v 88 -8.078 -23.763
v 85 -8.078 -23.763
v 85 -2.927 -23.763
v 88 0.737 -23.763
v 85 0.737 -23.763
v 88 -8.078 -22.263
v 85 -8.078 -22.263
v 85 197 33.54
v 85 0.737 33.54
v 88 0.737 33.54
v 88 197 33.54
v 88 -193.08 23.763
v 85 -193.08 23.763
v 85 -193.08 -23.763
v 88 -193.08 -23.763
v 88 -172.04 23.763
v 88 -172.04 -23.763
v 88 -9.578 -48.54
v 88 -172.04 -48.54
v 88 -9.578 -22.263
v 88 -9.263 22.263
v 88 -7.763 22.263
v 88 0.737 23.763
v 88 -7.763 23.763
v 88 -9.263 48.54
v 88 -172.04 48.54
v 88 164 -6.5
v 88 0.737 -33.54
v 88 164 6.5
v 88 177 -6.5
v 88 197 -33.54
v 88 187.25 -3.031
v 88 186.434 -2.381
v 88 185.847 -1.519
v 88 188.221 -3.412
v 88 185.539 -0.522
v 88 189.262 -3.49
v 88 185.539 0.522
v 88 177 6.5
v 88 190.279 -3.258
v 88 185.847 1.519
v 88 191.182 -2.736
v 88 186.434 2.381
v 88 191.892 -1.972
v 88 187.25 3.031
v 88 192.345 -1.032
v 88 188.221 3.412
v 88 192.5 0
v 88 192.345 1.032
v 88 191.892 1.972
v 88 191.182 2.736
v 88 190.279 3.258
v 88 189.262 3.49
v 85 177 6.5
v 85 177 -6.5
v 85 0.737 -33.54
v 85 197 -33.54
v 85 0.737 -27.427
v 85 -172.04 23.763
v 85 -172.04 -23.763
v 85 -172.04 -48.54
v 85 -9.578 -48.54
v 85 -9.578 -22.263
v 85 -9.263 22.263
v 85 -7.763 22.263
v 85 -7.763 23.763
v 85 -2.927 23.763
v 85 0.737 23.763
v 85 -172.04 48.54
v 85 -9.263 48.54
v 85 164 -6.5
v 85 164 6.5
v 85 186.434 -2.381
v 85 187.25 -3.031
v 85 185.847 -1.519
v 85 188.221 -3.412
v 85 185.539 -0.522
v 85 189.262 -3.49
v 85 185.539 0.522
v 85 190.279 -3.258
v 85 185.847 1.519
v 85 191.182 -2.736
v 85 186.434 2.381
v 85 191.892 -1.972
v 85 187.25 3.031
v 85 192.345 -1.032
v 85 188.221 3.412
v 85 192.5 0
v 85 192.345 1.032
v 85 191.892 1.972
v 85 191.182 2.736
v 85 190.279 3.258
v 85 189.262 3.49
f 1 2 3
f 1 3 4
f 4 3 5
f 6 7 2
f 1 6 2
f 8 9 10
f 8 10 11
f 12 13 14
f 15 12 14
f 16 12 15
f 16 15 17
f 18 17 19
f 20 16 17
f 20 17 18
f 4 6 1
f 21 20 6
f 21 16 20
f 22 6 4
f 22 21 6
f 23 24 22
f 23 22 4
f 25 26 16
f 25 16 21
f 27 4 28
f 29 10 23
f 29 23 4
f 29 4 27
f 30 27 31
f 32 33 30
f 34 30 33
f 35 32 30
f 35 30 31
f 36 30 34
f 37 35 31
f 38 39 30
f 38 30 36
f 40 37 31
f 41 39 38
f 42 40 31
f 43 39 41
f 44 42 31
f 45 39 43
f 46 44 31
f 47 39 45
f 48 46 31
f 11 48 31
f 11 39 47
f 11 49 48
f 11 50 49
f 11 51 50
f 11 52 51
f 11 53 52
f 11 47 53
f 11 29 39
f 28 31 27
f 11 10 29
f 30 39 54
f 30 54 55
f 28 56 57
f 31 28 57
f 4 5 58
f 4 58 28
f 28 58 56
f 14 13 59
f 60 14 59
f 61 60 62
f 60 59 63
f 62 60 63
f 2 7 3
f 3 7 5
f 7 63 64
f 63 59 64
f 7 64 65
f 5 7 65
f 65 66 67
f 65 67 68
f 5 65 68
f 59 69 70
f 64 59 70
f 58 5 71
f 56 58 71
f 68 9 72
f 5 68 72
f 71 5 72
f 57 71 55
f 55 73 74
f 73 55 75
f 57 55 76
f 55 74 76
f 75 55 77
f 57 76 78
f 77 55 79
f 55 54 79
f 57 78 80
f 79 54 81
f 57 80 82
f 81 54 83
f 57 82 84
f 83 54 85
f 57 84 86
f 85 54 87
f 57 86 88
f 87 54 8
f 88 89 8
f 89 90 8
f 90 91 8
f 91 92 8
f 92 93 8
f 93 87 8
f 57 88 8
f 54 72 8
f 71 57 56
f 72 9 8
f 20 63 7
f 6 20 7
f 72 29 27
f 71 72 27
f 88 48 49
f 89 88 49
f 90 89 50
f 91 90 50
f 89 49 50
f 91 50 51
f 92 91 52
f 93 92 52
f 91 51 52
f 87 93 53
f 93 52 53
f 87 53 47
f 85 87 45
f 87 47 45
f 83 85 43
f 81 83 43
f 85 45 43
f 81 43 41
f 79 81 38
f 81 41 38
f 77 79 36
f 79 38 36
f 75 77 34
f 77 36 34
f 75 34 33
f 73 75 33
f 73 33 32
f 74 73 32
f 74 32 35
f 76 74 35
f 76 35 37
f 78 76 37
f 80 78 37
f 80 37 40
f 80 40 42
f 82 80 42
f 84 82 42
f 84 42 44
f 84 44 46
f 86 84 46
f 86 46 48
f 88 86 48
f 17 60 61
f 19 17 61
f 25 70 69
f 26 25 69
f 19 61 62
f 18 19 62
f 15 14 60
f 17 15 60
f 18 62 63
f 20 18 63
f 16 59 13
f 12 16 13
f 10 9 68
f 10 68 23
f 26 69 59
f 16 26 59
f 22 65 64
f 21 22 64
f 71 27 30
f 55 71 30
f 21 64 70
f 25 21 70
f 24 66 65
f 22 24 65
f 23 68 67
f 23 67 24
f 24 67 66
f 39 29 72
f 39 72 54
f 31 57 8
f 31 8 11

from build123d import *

# Parameters (mm, degrees)
SKETCH1_W                     = 170
SKETCH1_H                     = 55
BASE_FLANGE1_DEPTH            = 3
EDGE_FLANGE1_STRIP_W          = 13.4732
EDGE_FLANGE1_STRIP_H          = 3
EDGE_FLANGE1_STRIP_CUT_DEPTH  = 162.776884107
EDGE_FLANGE1_RELIEF_W         = 14.9732
EDGE_FLANGE1_RELIEF_H         = 1.5
EDGE_FLANGE1_RELIEF_CUT_DEPTH = 3
EDGE_FLANGE1_DEPTH            = 162.776884107
EDGE_FLANGE2_STRIP_W          = 13.4732
EDGE_FLANGE2_STRIP_H          = 3
EDGE_FLANGE2_STRIP_CUT_DEPTH  = 162.461666913
EDGE_FLANGE2_RELIEF_W         = 14.9732
EDGE_FLANGE2_RELIEF_H         = 1.5
EDGE_FLANGE2_RELIEF_CUT_DEPTH = 3
EDGE_FLANGE2_DEPTH            = 162.461666913
EDGE_FLANGE3_STRIP_W          = 13.4732
EDGE_FLANGE3_STRIP_H          = 3
EDGE_FLANGE3_STRIP_CUT_DEPTH  = 47.5268
EDGE_FLANGE3_DEPTH            = 47.5268
EDGE_FLANGE4_STRIP_W          = 13.4732
EDGE_FLANGE4_STRIP_H          = 3
EDGE_FLANGE4_STRIP_CUT_DEPTH  = 55
EDGE_FLANGE4_DEPTH            = 55
EDGE_FLANGE5_STRIP_W          = 13.4732
EDGE_FLANGE5_STRIP_H          = 3
EDGE_FLANGE5_STRIP_CUT_DEPTH  = 196.2634
EDGE_FLANGE5_DEPTH            = 196.2634
EDGE_FLANGE6_STRIP_W          = 13.4732
EDGE_FLANGE6_STRIP_H          = 3
EDGE_FLANGE6_STRIP_CUT_DEPTH  = 196.2634
EDGE_FLANGE6_DEPTH            = 196.2634
SKETCH27_R                    = 3.5
SKETCH27_W                    = 13
SKETCH27_H                    = 13
CUT_EXTRUDE1_DEPTH            = 10
UNFOLD1_START                 = -85
UNFOLD1_DEPTH                 = 170
UNFOLD1_START_2               = 85
UNFOLD1_2_DEPTH               = 3
SKETCH28_W                    = 4.727050269
SKETCH28_H                    = 8.499758958
CUT_EXTRUDE2_DEPTH            = 10
SKETCH29_W                    = 4.501036857
SKETCH29_H                    = 9.383895171
CUT_EXTRUDE3_DEPTH            = 10
FOLD2_START                   = -193.080086129
FOLD2_OUTLINE_W               = 3
FOLD2_OUTLINE_H               = 97.08008613
FOLD2_DEPTH                   = 190.080086129
FOLD2_START_2                 = 0.7366
FOLD2_2_DEPTH                 = 196.2634
FOLD2_START_3                 = -2.776643065
FOLD2_3_DEPTH                 = 2.776643065
FOLD2_4_OUTLINE_W             = 162.776884107
FOLD2_4_OUTLINE_H             = 3
FOLD2_4_OUTLINE_W_2           = 162.461666913
FOLD2_4_DEPTH                 = 21.2634
FOLD2_START_4                 = 22
FOLD2_5_DEPTH                 = 175
FOLD2_START_5                 = 87.103787073
FOLD2_6_OUTLINE_W             = 0.223356935
FOLD2_6_OUTLINE_H             = 47.5268
FOLD2_6_DEPTH                 = 1.896212927
FOLD2_START_6                 = -85
FOLD2_7_DEPTH                 = 162.461666913
FOLD2_START_7                 = -106.040043065
FOLD2_8_OUTLINE_W             = 0.223356935
FOLD2_8_OUTLINE_H             = 47.5268
FOLD2_8_DEPTH                 = 21.040043065
FOLD2_START_8                 = 79.276884107
FOLD2_9_OUTLINE_W             = 0.223356935
FOLD2_9_OUTLINE_H             = 47.5268
FOLD2_9_DEPTH                 = 4.986515893
FOLD2_START_9                 = 77.461666913
FOLD2_10_DEPTH                = 0.315217194
FOLD2_START_10                = -23.7634
FOLD2_11_DEPTH                = 47.5268
FOLD2_START_11                = -22.2634
FOLD2_12_OUTLINE_W            = 1.815217194
FOLD2_12_OUTLINE_H            = 0.223356935
FOLD2_12_DEPTH                = 44.5268
FOLD2_13_DEPTH                = 47.5268
FOLD2_14_OUTLINE_W            = 0.315217194
FOLD2_14_OUTLINE_H            = 0.223356935
FOLD2_14_DEPTH                = 46.0268
FOLD2_15_OUTLINE_W            = 0.315217194
FOLD2_15_OUTLINE_H            = 0.223356935
FOLD2_15_DEPTH                = 46.0268
FOLD3_START                   = -23.7634
FOLD3_DEPTH                   = 47.5268
FOLD3_2_DEPTH                 = 47.5268
UNFOLD2_START                 = -85
UNFOLD2_DEPTH                 = 170
UNFOLD2_START_2               = 85
UNFOLD2_2_OUTLINE_W           = 196.2634
UNFOLD2_2_OUTLINE_H           = 9.776643065
UNFOLD2_2_DEPTH               = 3


with BuildPart() as part:
    # Base-Flange1: sheet metal written as solids
    # Sketch1 → Base-Flange1 (new body)
    with BuildSketch(Plane(origin=(0, 0, 0), x_dir=(1, 0, 0), z_dir=(0, 1, 0))):
        Rectangle(SKETCH1_W, SKETCH1_H)
    extrude(amount=-BASE_FLANGE1_DEPTH)

    # Edge-Flange1: sheet metal written as solids
    # Edge-Flange1 strip (on a plane across the edge) → Edge-Flange1 strip cut (cut)
    with BuildSketch(Plane(origin=(-85, 0, 27.5), x_dir=(0, 0, -1), z_dir=(1, 0, 0))):
        with Locations((-3, -1.5)):
            Rectangle(EDGE_FLANGE1_STRIP_W, EDGE_FLANGE1_STRIP_H)
    extrude(amount=EDGE_FLANGE1_STRIP_CUT_DEPTH, mode=Mode.SUBTRACT)

    # Edge-Flange1 relief (on the sheet) → Edge-Flange1 relief cut (cut)
    with BuildSketch(Plane(origin=(-85, 0, 23.7634), x_dir=(0, 0, -1), z_dir=(0, 1, 0))):
        with Locations((-5.9866, -163.526884107)):
            Rectangle(EDGE_FLANGE1_RELIEF_W, EDGE_FLANGE1_RELIEF_H)
    extrude(amount=-EDGE_FLANGE1_RELIEF_CUT_DEPTH, mode=Mode.SUBTRACT)

    # Edge-Flange1 section (on a plane across the edge) → Edge-Flange1 (add)
    with BuildSketch(Plane(origin=(-85, 0, 27.5), x_dir=(0, 0, -1), z_dir=(1, 0, 0))):
        with BuildLine():
            Line((0, 0.7366), (0, 22))
            Line((0, 22), (3, 22))
            Line((3, 22), (3, 0.7366))
            ThreePointArc((3, 0.7366), (3.215745145, 0.215745145), (3.7366, 0))
            Line((3.7366, 0), (3.7366, -3))
            ThreePointArc((3.7366, -3), (1.094424801, -1.905575199), (0, 0.7366))
        make_face()
    extrude(amount=EDGE_FLANGE1_DEPTH)

    # Edge-Flange2: sheet metal written as solids
    # Edge-Flange2 strip (on a plane across the edge) → Edge-Flange2 strip cut (cut)
    with BuildSketch(Plane(origin=(77.461666913, 0, -27.5), x_dir=(0, 0, 1), z_dir=(-1, 0, 0))):
        with Locations((-3, -1.5)):
            Rectangle(EDGE_FLANGE2_STRIP_W, EDGE_FLANGE2_STRIP_H)
    extrude(amount=EDGE_FLANGE2_STRIP_CUT_DEPTH, mode=Mode.SUBTRACT)

    # Edge-Flange2 relief (on the sheet) → Edge-Flange2 relief cut (cut)
    with BuildSketch(Plane(origin=(77.461666913, 0, -23.7634), x_dir=(0, 0, 1), z_dir=(0, 1, 0))):
        with Locations((-5.9866, 0.75)):
            Rectangle(EDGE_FLANGE2_RELIEF_W, EDGE_FLANGE2_RELIEF_H)
    extrude(amount=-EDGE_FLANGE2_RELIEF_CUT_DEPTH, mode=Mode.SUBTRACT)

    # Edge-Flange2 section (on a plane across the edge) → Edge-Flange2 (add)
    with BuildSketch(Plane(origin=(77.461666913, 0, -27.5), x_dir=(0, 0, 1), z_dir=(-1, 0, 0))):
        with BuildLine():
            Line((0, 0.7366), (0, 22))
            Line((0, 22), (3, 22))
            Line((3, 22), (3, 0.7366))
            ThreePointArc((3, 0.7366), (3.215745145, 0.215745145), (3.7366, 0))
            Line((3.7366, 0), (3.7366, -3))
            ThreePointArc((3.7366, -3), (1.094424801, -1.905575199), (0, 0.7366))
        make_face()
    extrude(amount=EDGE_FLANGE2_DEPTH)

    # Edge-Flange3: sheet metal written as solids
    # Edge-Flange3 strip (on a plane across the edge) → Edge-Flange3 strip cut (cut)
    with BuildSketch(Plane(origin=(-85, 0, -23.7634), x_dir=(1, 0, 0), z_dir=(0, 0, 1))):
        with Locations((-3, -1.5)):
            Rectangle(EDGE_FLANGE3_STRIP_W, EDGE_FLANGE3_STRIP_H)
    extrude(amount=EDGE_FLANGE3_STRIP_CUT_DEPTH, mode=Mode.SUBTRACT)

    # Edge-Flange3 section (on a plane across the edge) → Edge-Flange3 (add)
    with BuildSketch(Plane(origin=(-85, 0, -23.7634), x_dir=(1, 0, 0), z_dir=(0, 0, 1))):
        with BuildLine():
            Line((0, 0.7366), (0, 22))
            Line((0, 22), (3, 22))
            Line((3, 22), (3, 0.7366))
            ThreePointArc((3, 0.7366), (3.215745145, 0.215745145), (3.7366, 0))
            Line((3.7366, 0), (3.7366, -3))
            ThreePointArc((3.7366, -3), (1.094424801, -1.905575199), (0, 0.7366))
        make_face()
    extrude(amount=EDGE_FLANGE3_DEPTH)

    # Edge-Flange4: sheet metal written as solids
    # Edge-Flange4 strip (on a plane across the edge) → Edge-Flange4 strip cut (cut)
    with BuildSketch(Plane(origin=(85, 0, 27.5), x_dir=(-1, 0, 0), z_dir=(0, 0, -1))):
        with Locations((-6, -1.5)):
            Rectangle(EDGE_FLANGE4_STRIP_W, EDGE_FLANGE4_STRIP_H)
    extrude(amount=EDGE_FLANGE4_STRIP_CUT_DEPTH, mode=Mode.SUBTRACT)

    # Edge-Flange4 section (on a plane across the edge) → Edge-Flange4 (add)
    with BuildSketch(Plane(origin=(85, 0, 27.5), x_dir=(-1, 0, 0), z_dir=(0, 0, -1))):
        with BuildLine():
            Line((-3, 0.7366), (-3, 197))
            Line((-3, 197), (0, 197))
            Line((0, 197), (0, 0.7366))
            ThreePointArc((0, 0.7366), (0.215745145, 0.215745145), (0.7366, 0))
            Line((0.7366, 0), (0.7366, -3))
            ThreePointArc((0.7366, -3), (-1.905575199, -1.905575199), (-3, 0.7366))
        make_face()
    extrude(amount=EDGE_FLANGE4_DEPTH)

    # Edge-Flange5: sheet metal written as solids
    # Edge-Flange5 strip (on a plane across the edge) → Edge-Flange5 strip cut (cut)
    with BuildSketch(Plane(origin=(85, 0.7366, 27.5), x_dir=(0, 0, -1), z_dir=(0, 1, 0))):
        with Locations((-3, -1.5)):
            Rectangle(EDGE_FLANGE5_STRIP_W, EDGE_FLANGE5_STRIP_H)
    extrude(amount=EDGE_FLANGE5_STRIP_CUT_DEPTH, mode=Mode.SUBTRACT)

    # Edge-Flange5 section (on a plane across the edge) → Edge-Flange5 (add)
    with BuildSketch(Plane(origin=(85, 0.7366, 27.5), x_dir=(0, 0, -1), z_dir=(0, 1, 0))):
        with BuildLine():
            Line((0, 0.7366), (0, 7))
            Line((0, 7), (3, 7))
            Line((3, 7), (3, 0.7366))
            ThreePointArc((3, 0.7366), (3.215745145, 0.215745145), (3.7366, 0))
            Line((3.7366, 0), (3.7366, -3))
            ThreePointArc((3.7366, -3), (1.094424801, -1.905575199), (0, 0.7366))
        make_face()
    extrude(amount=EDGE_FLANGE5_DEPTH)

    # Edge-Flange6: sheet metal written as solids
    # Edge-Flange6 strip (on a plane across the edge) → Edge-Flange6 strip cut (cut)
    with BuildSketch(Plane(origin=(85, 197, -27.5), x_dir=(0, 0, 1), z_dir=(0, -1, 0))):
        with Locations((-3, -1.5)):
            Rectangle(EDGE_FLANGE6_STRIP_W, EDGE_FLANGE6_STRIP_H)
    extrude(amount=EDGE_FLANGE6_STRIP_CUT_DEPTH, mode=Mode.SUBTRACT)

    # Edge-Flange6 section (on a plane across the edge) → Edge-Flange6 (add)
    with BuildSketch(Plane(origin=(85, 197, -27.5), x_dir=(0, 0, 1), z_dir=(0, -1, 0))):
        with BuildLine():
            Line((0, 0.7366), (0, 7))
            Line((0, 7), (3, 7))
            Line((3, 7), (3, 0.7366))
            ThreePointArc((3, 0.7366), (3.215745145, 0.215745145), (3.7366, 0))
            Line((3.7366, 0), (3.7366, -3))
            ThreePointArc((3.7366, -3), (1.094424801, -1.905575199), (0, 0.7366))
        make_face()
    extrude(amount=EDGE_FLANGE6_DEPTH)

    # Sketch27 → Cut-Extrude1 (cut)
    with BuildSketch(Plane(origin=(88, 0, 0), x_dir=(0, 0, -1), z_dir=(1, 0, 0))):
        with Locations(Location((0, 189, 0), (0, 0, 90))):
            Circle(SKETCH27_R)
        with Locations((0, 170.5)):
            Rectangle(SKETCH27_W, SKETCH27_H)
    extrude(amount=-CUT_EXTRUDE1_DEPTH, mode=Mode.SUBTRACT)

    # Unfold1: read off the stored shape, not the designer's step
    # Unfold1 outline → Unfold1 (cut)
    with BuildSketch(Plane.YZ.offset(UNFOLD1_START)):
        Polygon((197, -27.5), (197, -23.7634), (22, -23.7634), (22, 23.7634), (197, 23.7634), (197, 27.5), (-7.763158958, 27.5), (-7.763158958, 22.2634), (-9.263158958, 22.2634), (-9.263158958, 23.7634), (-168.303443065, 23.7634), (-168.303443065, -23.7634), (-9.578376152, -23.7634), (-9.578376152, -22.2634), (-8.078376152, -22.2634), (-8.078376152, -27.5), align=None)
    extrude(amount=UNFOLD1_DEPTH, mode=Mode.SUBTRACT)

    # Unfold1 2 outline → Unfold1 2 (add)
    with BuildSketch(Plane.YZ.offset(UNFOLD1_START_2)):
        Polygon((0.7366, -27.5), (0.7366, -33.540043065), (197, -33.540043065), (197, -23.7634), (0.7366, -23.7634), (0.7366, 23.7634), (197, 23.7634), (197, 33.540043065), (0.7366, 33.540043065), (0.7366, 27.5), (-7.763158958, 27.5), (-7.763158958, 22.2634), (-9.263158958, 22.2634), (-9.263158958, 48.540043065), (-172.040043065, 48.540043065), (-172.040043065, 23.7634), (-193.080086129, 23.7634), (-193.080086129, -23.7634), (-172.040043065, -23.7634), (-172.040043065, -48.540043065), (-9.578376152, -48.540043065), (-9.578376152, -22.2634), (-8.078376152, -22.2634), (-8.078376152, -27.5), align=None)
    extrude(amount=UNFOLD1_2_DEPTH)

    # Sketch28 → Cut-Extrude2 (cut)
    with BuildSketch(Plane(origin=(88, 0, 0), x_dir=(0, 0, -1), z_dir=(1, 0, 0))):
        with Locations((-26.126925134, -3.513279479)):
            Rectangle(SKETCH28_W, SKETCH28_H)
    extrude(amount=-CUT_EXTRUDE2_DEPTH, mode=Mode.SUBTRACT)

    # Sketch29 → Cut-Extrude3 (cut)
    with BuildSketch(Plane(origin=(88, 0, 0), x_dir=(0, 0, -1), z_dir=(1, 0, 0))):
        with Locations((26.013918429, -3.955347585)):
            Rectangle(SKETCH29_W, SKETCH29_H)
    extrude(amount=-CUT_EXTRUDE3_DEPTH, mode=Mode.SUBTRACT)

    # Fold2: read off the stored shape, not the designer's step
    # Fold2 outline → Fold2 (cut)
    with BuildSketch(Plane(origin=(0, 0, 0), x_dir=(1, 0, 0), z_dir=(0, 1, 0)).offset(FOLD2_START)):
        with Locations((86.5, 0)):
            Rectangle(FOLD2_OUTLINE_W, FOLD2_OUTLINE_H)
    extrude(amount=FOLD2_DEPTH, mode=Mode.SUBTRACT)

    # Fold2 2 outline → Fold2 2 (cut)
    with BuildSketch(Plane(origin=(0, 0, 0), x_dir=(1, 0, 0), z_dir=(0, 1, 0)).offset(FOLD2_START_2)):
        with BuildLine():
            Line((88, -33.540043065), (88, -23.7634))
            ThreePointArc((88, -23.7634), (87.154295979, -26.130867001), (85, -27.426677222))
            Line((85, -27.426677222), (85, -33.540043065))
            Line((85, -33.540043065), (88, -33.540043065))
        make_face()
        with BuildLine():
            ThreePointArc((85, 27.426677222), (87.154295979, 26.130867001), (88, 23.7634))
            Line((88, 23.7634), (88, 33.540043065))
            Line((88, 33.540043065), (85, 33.540043065))
            Line((85, 33.540043065), (85, 27.426677222))
        make_face()
    extrude(amount=FOLD2_2_DEPTH, mode=Mode.SUBTRACT)

    # Fold2 3 outline → Fold2 3 (add)
    with BuildSketch(Plane(origin=(0, 0, 0), x_dir=(1, 0, 0), z_dir=(0, 1, 0)).offset(FOLD2_START_3)):
        Polygon((77.776884107, -22.2634), (79.276884107, -22.2634), (79.276884107, -23.7634), (85, -23.7634), (85, 23.7634), (78.961666913, 23.7634), (78.961666913, 22.2634), (77.461666913, 22.2634), (77.461666913, 24.5), (-85, 24.5), (-85, 23.7634), (-106.040043065, 23.7634), (-106.040043065, -23.7634), (-85, -23.7634), (-85, -24.5), (77.776884107, -24.5), align=None)
    extrude(amount=FOLD2_3_DEPTH)

    # Fold2 4 outline → Fold2 4 (add)
    with BuildSketch(Plane(origin=(0, 0, 0), x_dir=(1, 0, 0), z_dir=(0, 1, 0)).offset(FOLD2_START_2)):
        with BuildLine():
            Line((85, -27.426677222), (85, -23.7634))
            ThreePointArc((85, -23.7634), (84.784254855, -24.284254855), (84.2634, -24.5))
            Line((84.2634, -24.5), (78, -24.5))
            Line((78, -24.5), (78, -27.5))
            Line((78, -27.5), (84.2634, -27.5))
            ThreePointArc((84.2634, -27.5), (84.63352018, -27.481624121), (85, -27.426677222))
        make_face()
        with Locations((-3.611557946, -26)):
            Rectangle(FOLD2_4_OUTLINE_W, FOLD2_4_OUTLINE_H)
        with BuildLine():
            ThreePointArc((84.2634, 24.5), (84.784254855, 24.284254855), (85, 23.7634))
            Line((85, 23.7634), (85, 27.426677222))
            ThreePointArc((85, 27.426677222), (84.63352018, 27.481624121), (84.2634, 27.5))
            Line((84.2634, 27.5), (78, 27.5))
            Line((78, 27.5), (78, 24.5))
            Line((78, 24.5), (84.2634, 24.5))
        make_face()
        with Locations((-3.769166543, 26)):
            Rectangle(FOLD2_4_OUTLINE_W_2, FOLD2_4_OUTLINE_H)
    extrude(amount=FOLD2_4_DEPTH)

    # Fold2 5 outline → Fold2 5 (add)
    with BuildSketch(Plane(origin=(0, 0, 0), x_dir=(1, 0, 0), z_dir=(0, 1, 0)).offset(FOLD2_START_4)):
        with BuildLine():
            Line((85, -27.426677222), (85, -23.7634))
            ThreePointArc((85, -23.7634), (84.784254855, -24.284254855), (84.2634, -24.5))
            Line((84.2634, -24.5), (78, -24.5))
            Line((78, -24.5), (78, -27.5))
            Line((78, -27.5), (84.2634, -27.5))
            ThreePointArc((84.2634, -27.5), (84.63352018, -27.481624121), (85, -27.426677222))
        make_face()
        with BuildLine():
            ThreePointArc((84.2634, 24.5), (84.784254855, 24.284254855), (85, 23.7634))
            Line((85, 23.7634), (85, 27.426677222))
            ThreePointArc((85, 27.426677222), (84.63352018, 27.481624121), (84.2634, 27.5))
            Line((84.2634, 27.5), (78, 27.5))
            Line((78, 27.5), (78, 24.5))
            Line((78, 24.5), (84.2634, 24.5))
        make_face()
    extrude(amount=FOLD2_5_DEPTH)

    # Fold2 6 outline → Fold2 6 (cut)
    with BuildSketch(Plane.YZ.offset(FOLD2_START_5)):
        with Locations((-2.888321533, 0)):
            Rectangle(FOLD2_6_OUTLINE_W, FOLD2_6_OUTLINE_H)
    extrude(amount=FOLD2_6_DEPTH, mode=Mode.SUBTRACT)

    # Fold2 7 outline → Fold2 7 (add)
    with BuildSketch(Plane.YZ.offset(FOLD2_START_6)):
        with BuildLine():
            Line((0, -23.7634), (-2.776643065, -23.7634))
            Line((-2.776643065, -23.7634), (-2.776643065, 23.7634))
            Line((-2.776643065, 23.7634), (0, 23.7634))
            ThreePointArc((0, 23.7634), (0.215745145, 24.284254855), (0.7366, 24.5))
            Line((0.7366, 24.5), (0.7366, 27.5))
            ThreePointArc((0.7366, 27.5), (-1.905575199, 26.405575199), (-3, 23.7634))
            Line((-3, 23.7634), (-3, -23.7634))
            ThreePointArc((-3, -23.7634), (-1.905575199, -26.405575199), (0.7366, -27.5))
            Line((0.7366, -27.5), (0.7366, -24.5))
            ThreePointArc((0.7366, -24.5), (0.215745145, -24.284254855), (0, -23.7634))
        make_face()
    extrude(amount=FOLD2_7_DEPTH)

    # Fold2 8 outline → Fold2 8 (add)
    with BuildSketch(Plane.YZ.offset(FOLD2_START_7)):
        with Locations((-2.888321533, 0)):
            Rectangle(FOLD2_8_OUTLINE_W, FOLD2_8_OUTLINE_H)
    extrude(amount=FOLD2_8_DEPTH)

    # Fold2 9 outline → Fold2 9 (add)
    with BuildSketch(Plane.YZ.offset(FOLD2_START_8)):
        with Locations((-2.888321533, 0)):
            Rectangle(FOLD2_9_OUTLINE_W, FOLD2_9_OUTLINE_H)
    extrude(amount=FOLD2_9_DEPTH)

    # Fold2 10 outline → Fold2 10 (add)
    with BuildSketch(Plane.YZ.offset(FOLD2_START_9)):
        with BuildLine():
            ThreePointArc((0.7366, 27.5), (-1.905575199, 26.405575199), (-3, 23.7634))
            Line((-3, 23.7634), (-2.776643065, 23.7634))
            Line((-2.776643065, 23.7634), (0, 23.7634))
            ThreePointArc((0, 23.7634), (0.215745145, 24.284254855), (0.7366, 24.5))
            Line((0.7366, 24.5), (0.7366, 27.5))
        make_face()
    extrude(amount=FOLD2_10_DEPTH)

    # Fold2 11 outline → Fold2 11 (cut)
    with BuildSketch(Plane.XY.offset(FOLD2_START_10)):
        with BuildLine():
            Line((88, -2.776643065), (88, 0.7366))
            ThreePointArc((88, 0.7366), (87.154295979, -1.630867001), (85, -2.926677222))
            Line((85, -2.926677222), (85, -3))
            Line((85, -3), (87.103787073, -3))
            Line((87.103787073, -3), (87.103787073, -2.776643065))
            Line((87.103787073, -2.776643065), (88, -2.776643065))
        make_face()
    extrude(amount=FOLD2_11_DEPTH, mode=Mode.SUBTRACT)

    # Fold2 12 outline → Fold2 12 (add)
    with BuildSketch(Plane.XY.offset(FOLD2_START_11)):
        with BuildLine():
            ThreePointArc((85, 0.7366), (84.784254855, 0.215745145), (84.2634, 0))
            Line((84.2634, 0), (85, 0))
            Line((85, 0), (85, 0.7366))
        make_face()
        with Locations((78.36927551, -2.888321533)):
            Rectangle(FOLD2_12_OUTLINE_W, FOLD2_12_OUTLINE_H)
        with BuildLine():
            ThreePointArc((84.2634, -3), (84.63352018, -2.981624121), (85, -2.926677222))
            Line((85, -2.926677222), (85, -2.776643065))
            Line((85, -2.776643065), (84.2634, -2.776643065))
            Line((84.2634, -2.776643065), (84.2634, -3))
        make_face()
    extrude(amount=FOLD2_12_DEPTH)

    # Fold2 13 outline → Fold2 13 (add)
    with BuildSketch(Plane.XY.offset(FOLD2_START_10)):
        with BuildLine():
            ThreePointArc((85, 0.7366), (84.784254855, 0.215745145), (84.2634, 0))
            Line((84.2634, 0), (85, 0))
            Line((85, 0), (85, 0.7366))
        make_face()
        with BuildLine():
            ThreePointArc((84.2634, -3), (84.63352018, -2.981624121), (85, -2.926677222))
            Line((85, -2.926677222), (85, -2.776643065))
            Line((85, -2.776643065), (84.2634, -2.776643065))
            Line((84.2634, -2.776643065), (84.2634, -3))
        make_face()
    extrude(amount=FOLD2_13_DEPTH)

    # Fold2 14 outline → Fold2 14 (add)
    with BuildSketch(Plane.XY.offset(FOLD2_START_10)):
        with Locations((79.11927551, -2.888321533)):
            Rectangle(FOLD2_14_OUTLINE_W, FOLD2_14_OUTLINE_H)
    extrude(amount=FOLD2_14_DEPTH)

    # Fold2 15 outline → Fold2 15 (add)
    with BuildSketch(Plane.XY.offset(FOLD2_START_11)):
        with Locations((77.61927551, -2.888321533)):
            Rectangle(FOLD2_15_OUTLINE_W, FOLD2_15_OUTLINE_H)
    extrude(amount=FOLD2_15_DEPTH)

    # Fold3: read off the stored shape, not the designer's step
    # Fold3 outline → Fold3 (cut)
    with BuildSketch(Plane.XY.offset(FOLD3_START)):
        with BuildLine():
            ThreePointArc((-81.2634, -3), (-83.630867001, -2.154295979), (-84.926677222, 0))
            Line((-84.926677222, 0), (-106.040043065, 0))
            Line((-106.040043065, 0), (-106.040043065, -3))
            Line((-106.040043065, -3), (-81.2634, -3))
        make_face()
    extrude(amount=FOLD3_DEPTH, mode=Mode.SUBTRACT)

    # Fold3 2 outline → Fold3 2 (add)
    with BuildSketch(Plane.XY.offset(FOLD3_START)):
        with BuildLine():
            Line((-85, 22), (-85, 0.7366))
            ThreePointArc((-85, 0.7366), (-84.981624121, 0.36647982), (-84.926677222, 0))
            Line((-84.926677222, 0), (-81.2634, 0))
            ThreePointArc((-81.2634, 0), (-81.784254855, 0.215745145), (-82, 0.7366))
            Line((-82, 0.7366), (-82, 22))
            Line((-82, 22), (-85, 22))
        make_face()
    extrude(amount=FOLD3_2_DEPTH)

    # Unfold2: read off the stored shape, not the designer's step
    # Unfold2 outline → Unfold2 (cut)
    with BuildSketch(Plane.YZ.offset(UNFOLD2_START)):
        with BuildLine():
            Line((-9.578376152, -22.2634), (-8.078376152, -22.2634))
            Line((-8.078376152, -22.2634), (-8.078376152, -23.7634))
            Line((-8.078376152, -23.7634), (-3, -23.7634))
            ThreePointArc((-3, -23.7634), (-1.905575199, -26.405575199), (0.7366, -27.5))
            Line((0.7366, -27.5), (197, -27.5))
            Line((197, -27.5), (197, -23.7634))
            Line((197, -23.7634), (22, -23.7634))
            Line((22, -23.7634), (22, 23.7634))
            Line((22, 23.7634), (197, 23.7634))
            Line((197, 23.7634), (197, 27.5))
            Line((197, 27.5), (0.7366, 27.5))
            ThreePointArc((0.7366, 27.5), (-1.905575199, 26.405575199), (-3, 23.7634))
            Line((-3, 23.7634), (-7.763158958, 23.7634))
            Line((-7.763158958, 23.7634), (-7.763158958, 22.2634))
            Line((-7.763158958, 22.2634), (-9.263158958, 22.2634))
            Line((-9.263158958, 22.2634), (-9.263158958, 23.7634))
            Line((-9.263158958, 23.7634), (-168.303443065, 23.7634))
            Line((-168.303443065, 23.7634), (-168.303443065, -23.7634))
            Line((-168.303443065, -23.7634), (-9.578376152, -23.7634))
            Line((-9.578376152, -23.7634), (-9.578376152, -22.2634))
        make_face()
        with BuildLine():
            Line((0.7366, 23.7634), (0, 23.7634))
            ThreePointArc((0, 23.7634), (0.215745145, 24.284254855), (0.7366, 24.5))
            Line((0.7366, 24.5), (0.7366, 23.7634))
        make_face(mode=Mode.SUBTRACT)
        with BuildLine():
            Line((0, -23.7634), (0.7366, -23.7634))
            Line((0.7366, -23.7634), (0.7366, -24.5))
            ThreePointArc((0.7366, -24.5), (0.215745145, -24.284254855), (0, -23.7634))
        make_face(mode=Mode.SUBTRACT)
    extrude(amount=UNFOLD2_DEPTH, mode=Mode.SUBTRACT)

    # Unfold2 2 outline → Unfold2 2 (add)
    with BuildSketch(Plane.YZ.offset(UNFOLD2_START_2)):
        Polygon((-9.578376152, -22.2634), (-8.078376152, -22.2634), (-8.078376152, -23.7634), (0.7366, -23.7634), (0.7366, 23.7634), (-7.763158958, 23.7634), (-7.763158958, 22.2634), (-9.263158958, 22.2634), (-9.263158958, 48.540043065), (-172.040043065, 48.540043065), (-172.040043065, 23.7634), (-193.080086129, 23.7634), (-193.080086129, -23.7634), (-172.040043065, -23.7634), (-172.040043065, -48.540043065), (-9.578376152, -48.540043065), align=None)
        with Locations((98.8683, -28.651721532)):
            Rectangle(UNFOLD2_2_OUTLINE_W, UNFOLD2_2_OUTLINE_H)
        with Locations((98.8683, 28.651721532)):
            Rectangle(UNFOLD2_2_OUTLINE_W, UNFOLD2_2_OUTLINE_H)
    extrude(amount=UNFOLD2_2_DEPTH)


solid = part.part
